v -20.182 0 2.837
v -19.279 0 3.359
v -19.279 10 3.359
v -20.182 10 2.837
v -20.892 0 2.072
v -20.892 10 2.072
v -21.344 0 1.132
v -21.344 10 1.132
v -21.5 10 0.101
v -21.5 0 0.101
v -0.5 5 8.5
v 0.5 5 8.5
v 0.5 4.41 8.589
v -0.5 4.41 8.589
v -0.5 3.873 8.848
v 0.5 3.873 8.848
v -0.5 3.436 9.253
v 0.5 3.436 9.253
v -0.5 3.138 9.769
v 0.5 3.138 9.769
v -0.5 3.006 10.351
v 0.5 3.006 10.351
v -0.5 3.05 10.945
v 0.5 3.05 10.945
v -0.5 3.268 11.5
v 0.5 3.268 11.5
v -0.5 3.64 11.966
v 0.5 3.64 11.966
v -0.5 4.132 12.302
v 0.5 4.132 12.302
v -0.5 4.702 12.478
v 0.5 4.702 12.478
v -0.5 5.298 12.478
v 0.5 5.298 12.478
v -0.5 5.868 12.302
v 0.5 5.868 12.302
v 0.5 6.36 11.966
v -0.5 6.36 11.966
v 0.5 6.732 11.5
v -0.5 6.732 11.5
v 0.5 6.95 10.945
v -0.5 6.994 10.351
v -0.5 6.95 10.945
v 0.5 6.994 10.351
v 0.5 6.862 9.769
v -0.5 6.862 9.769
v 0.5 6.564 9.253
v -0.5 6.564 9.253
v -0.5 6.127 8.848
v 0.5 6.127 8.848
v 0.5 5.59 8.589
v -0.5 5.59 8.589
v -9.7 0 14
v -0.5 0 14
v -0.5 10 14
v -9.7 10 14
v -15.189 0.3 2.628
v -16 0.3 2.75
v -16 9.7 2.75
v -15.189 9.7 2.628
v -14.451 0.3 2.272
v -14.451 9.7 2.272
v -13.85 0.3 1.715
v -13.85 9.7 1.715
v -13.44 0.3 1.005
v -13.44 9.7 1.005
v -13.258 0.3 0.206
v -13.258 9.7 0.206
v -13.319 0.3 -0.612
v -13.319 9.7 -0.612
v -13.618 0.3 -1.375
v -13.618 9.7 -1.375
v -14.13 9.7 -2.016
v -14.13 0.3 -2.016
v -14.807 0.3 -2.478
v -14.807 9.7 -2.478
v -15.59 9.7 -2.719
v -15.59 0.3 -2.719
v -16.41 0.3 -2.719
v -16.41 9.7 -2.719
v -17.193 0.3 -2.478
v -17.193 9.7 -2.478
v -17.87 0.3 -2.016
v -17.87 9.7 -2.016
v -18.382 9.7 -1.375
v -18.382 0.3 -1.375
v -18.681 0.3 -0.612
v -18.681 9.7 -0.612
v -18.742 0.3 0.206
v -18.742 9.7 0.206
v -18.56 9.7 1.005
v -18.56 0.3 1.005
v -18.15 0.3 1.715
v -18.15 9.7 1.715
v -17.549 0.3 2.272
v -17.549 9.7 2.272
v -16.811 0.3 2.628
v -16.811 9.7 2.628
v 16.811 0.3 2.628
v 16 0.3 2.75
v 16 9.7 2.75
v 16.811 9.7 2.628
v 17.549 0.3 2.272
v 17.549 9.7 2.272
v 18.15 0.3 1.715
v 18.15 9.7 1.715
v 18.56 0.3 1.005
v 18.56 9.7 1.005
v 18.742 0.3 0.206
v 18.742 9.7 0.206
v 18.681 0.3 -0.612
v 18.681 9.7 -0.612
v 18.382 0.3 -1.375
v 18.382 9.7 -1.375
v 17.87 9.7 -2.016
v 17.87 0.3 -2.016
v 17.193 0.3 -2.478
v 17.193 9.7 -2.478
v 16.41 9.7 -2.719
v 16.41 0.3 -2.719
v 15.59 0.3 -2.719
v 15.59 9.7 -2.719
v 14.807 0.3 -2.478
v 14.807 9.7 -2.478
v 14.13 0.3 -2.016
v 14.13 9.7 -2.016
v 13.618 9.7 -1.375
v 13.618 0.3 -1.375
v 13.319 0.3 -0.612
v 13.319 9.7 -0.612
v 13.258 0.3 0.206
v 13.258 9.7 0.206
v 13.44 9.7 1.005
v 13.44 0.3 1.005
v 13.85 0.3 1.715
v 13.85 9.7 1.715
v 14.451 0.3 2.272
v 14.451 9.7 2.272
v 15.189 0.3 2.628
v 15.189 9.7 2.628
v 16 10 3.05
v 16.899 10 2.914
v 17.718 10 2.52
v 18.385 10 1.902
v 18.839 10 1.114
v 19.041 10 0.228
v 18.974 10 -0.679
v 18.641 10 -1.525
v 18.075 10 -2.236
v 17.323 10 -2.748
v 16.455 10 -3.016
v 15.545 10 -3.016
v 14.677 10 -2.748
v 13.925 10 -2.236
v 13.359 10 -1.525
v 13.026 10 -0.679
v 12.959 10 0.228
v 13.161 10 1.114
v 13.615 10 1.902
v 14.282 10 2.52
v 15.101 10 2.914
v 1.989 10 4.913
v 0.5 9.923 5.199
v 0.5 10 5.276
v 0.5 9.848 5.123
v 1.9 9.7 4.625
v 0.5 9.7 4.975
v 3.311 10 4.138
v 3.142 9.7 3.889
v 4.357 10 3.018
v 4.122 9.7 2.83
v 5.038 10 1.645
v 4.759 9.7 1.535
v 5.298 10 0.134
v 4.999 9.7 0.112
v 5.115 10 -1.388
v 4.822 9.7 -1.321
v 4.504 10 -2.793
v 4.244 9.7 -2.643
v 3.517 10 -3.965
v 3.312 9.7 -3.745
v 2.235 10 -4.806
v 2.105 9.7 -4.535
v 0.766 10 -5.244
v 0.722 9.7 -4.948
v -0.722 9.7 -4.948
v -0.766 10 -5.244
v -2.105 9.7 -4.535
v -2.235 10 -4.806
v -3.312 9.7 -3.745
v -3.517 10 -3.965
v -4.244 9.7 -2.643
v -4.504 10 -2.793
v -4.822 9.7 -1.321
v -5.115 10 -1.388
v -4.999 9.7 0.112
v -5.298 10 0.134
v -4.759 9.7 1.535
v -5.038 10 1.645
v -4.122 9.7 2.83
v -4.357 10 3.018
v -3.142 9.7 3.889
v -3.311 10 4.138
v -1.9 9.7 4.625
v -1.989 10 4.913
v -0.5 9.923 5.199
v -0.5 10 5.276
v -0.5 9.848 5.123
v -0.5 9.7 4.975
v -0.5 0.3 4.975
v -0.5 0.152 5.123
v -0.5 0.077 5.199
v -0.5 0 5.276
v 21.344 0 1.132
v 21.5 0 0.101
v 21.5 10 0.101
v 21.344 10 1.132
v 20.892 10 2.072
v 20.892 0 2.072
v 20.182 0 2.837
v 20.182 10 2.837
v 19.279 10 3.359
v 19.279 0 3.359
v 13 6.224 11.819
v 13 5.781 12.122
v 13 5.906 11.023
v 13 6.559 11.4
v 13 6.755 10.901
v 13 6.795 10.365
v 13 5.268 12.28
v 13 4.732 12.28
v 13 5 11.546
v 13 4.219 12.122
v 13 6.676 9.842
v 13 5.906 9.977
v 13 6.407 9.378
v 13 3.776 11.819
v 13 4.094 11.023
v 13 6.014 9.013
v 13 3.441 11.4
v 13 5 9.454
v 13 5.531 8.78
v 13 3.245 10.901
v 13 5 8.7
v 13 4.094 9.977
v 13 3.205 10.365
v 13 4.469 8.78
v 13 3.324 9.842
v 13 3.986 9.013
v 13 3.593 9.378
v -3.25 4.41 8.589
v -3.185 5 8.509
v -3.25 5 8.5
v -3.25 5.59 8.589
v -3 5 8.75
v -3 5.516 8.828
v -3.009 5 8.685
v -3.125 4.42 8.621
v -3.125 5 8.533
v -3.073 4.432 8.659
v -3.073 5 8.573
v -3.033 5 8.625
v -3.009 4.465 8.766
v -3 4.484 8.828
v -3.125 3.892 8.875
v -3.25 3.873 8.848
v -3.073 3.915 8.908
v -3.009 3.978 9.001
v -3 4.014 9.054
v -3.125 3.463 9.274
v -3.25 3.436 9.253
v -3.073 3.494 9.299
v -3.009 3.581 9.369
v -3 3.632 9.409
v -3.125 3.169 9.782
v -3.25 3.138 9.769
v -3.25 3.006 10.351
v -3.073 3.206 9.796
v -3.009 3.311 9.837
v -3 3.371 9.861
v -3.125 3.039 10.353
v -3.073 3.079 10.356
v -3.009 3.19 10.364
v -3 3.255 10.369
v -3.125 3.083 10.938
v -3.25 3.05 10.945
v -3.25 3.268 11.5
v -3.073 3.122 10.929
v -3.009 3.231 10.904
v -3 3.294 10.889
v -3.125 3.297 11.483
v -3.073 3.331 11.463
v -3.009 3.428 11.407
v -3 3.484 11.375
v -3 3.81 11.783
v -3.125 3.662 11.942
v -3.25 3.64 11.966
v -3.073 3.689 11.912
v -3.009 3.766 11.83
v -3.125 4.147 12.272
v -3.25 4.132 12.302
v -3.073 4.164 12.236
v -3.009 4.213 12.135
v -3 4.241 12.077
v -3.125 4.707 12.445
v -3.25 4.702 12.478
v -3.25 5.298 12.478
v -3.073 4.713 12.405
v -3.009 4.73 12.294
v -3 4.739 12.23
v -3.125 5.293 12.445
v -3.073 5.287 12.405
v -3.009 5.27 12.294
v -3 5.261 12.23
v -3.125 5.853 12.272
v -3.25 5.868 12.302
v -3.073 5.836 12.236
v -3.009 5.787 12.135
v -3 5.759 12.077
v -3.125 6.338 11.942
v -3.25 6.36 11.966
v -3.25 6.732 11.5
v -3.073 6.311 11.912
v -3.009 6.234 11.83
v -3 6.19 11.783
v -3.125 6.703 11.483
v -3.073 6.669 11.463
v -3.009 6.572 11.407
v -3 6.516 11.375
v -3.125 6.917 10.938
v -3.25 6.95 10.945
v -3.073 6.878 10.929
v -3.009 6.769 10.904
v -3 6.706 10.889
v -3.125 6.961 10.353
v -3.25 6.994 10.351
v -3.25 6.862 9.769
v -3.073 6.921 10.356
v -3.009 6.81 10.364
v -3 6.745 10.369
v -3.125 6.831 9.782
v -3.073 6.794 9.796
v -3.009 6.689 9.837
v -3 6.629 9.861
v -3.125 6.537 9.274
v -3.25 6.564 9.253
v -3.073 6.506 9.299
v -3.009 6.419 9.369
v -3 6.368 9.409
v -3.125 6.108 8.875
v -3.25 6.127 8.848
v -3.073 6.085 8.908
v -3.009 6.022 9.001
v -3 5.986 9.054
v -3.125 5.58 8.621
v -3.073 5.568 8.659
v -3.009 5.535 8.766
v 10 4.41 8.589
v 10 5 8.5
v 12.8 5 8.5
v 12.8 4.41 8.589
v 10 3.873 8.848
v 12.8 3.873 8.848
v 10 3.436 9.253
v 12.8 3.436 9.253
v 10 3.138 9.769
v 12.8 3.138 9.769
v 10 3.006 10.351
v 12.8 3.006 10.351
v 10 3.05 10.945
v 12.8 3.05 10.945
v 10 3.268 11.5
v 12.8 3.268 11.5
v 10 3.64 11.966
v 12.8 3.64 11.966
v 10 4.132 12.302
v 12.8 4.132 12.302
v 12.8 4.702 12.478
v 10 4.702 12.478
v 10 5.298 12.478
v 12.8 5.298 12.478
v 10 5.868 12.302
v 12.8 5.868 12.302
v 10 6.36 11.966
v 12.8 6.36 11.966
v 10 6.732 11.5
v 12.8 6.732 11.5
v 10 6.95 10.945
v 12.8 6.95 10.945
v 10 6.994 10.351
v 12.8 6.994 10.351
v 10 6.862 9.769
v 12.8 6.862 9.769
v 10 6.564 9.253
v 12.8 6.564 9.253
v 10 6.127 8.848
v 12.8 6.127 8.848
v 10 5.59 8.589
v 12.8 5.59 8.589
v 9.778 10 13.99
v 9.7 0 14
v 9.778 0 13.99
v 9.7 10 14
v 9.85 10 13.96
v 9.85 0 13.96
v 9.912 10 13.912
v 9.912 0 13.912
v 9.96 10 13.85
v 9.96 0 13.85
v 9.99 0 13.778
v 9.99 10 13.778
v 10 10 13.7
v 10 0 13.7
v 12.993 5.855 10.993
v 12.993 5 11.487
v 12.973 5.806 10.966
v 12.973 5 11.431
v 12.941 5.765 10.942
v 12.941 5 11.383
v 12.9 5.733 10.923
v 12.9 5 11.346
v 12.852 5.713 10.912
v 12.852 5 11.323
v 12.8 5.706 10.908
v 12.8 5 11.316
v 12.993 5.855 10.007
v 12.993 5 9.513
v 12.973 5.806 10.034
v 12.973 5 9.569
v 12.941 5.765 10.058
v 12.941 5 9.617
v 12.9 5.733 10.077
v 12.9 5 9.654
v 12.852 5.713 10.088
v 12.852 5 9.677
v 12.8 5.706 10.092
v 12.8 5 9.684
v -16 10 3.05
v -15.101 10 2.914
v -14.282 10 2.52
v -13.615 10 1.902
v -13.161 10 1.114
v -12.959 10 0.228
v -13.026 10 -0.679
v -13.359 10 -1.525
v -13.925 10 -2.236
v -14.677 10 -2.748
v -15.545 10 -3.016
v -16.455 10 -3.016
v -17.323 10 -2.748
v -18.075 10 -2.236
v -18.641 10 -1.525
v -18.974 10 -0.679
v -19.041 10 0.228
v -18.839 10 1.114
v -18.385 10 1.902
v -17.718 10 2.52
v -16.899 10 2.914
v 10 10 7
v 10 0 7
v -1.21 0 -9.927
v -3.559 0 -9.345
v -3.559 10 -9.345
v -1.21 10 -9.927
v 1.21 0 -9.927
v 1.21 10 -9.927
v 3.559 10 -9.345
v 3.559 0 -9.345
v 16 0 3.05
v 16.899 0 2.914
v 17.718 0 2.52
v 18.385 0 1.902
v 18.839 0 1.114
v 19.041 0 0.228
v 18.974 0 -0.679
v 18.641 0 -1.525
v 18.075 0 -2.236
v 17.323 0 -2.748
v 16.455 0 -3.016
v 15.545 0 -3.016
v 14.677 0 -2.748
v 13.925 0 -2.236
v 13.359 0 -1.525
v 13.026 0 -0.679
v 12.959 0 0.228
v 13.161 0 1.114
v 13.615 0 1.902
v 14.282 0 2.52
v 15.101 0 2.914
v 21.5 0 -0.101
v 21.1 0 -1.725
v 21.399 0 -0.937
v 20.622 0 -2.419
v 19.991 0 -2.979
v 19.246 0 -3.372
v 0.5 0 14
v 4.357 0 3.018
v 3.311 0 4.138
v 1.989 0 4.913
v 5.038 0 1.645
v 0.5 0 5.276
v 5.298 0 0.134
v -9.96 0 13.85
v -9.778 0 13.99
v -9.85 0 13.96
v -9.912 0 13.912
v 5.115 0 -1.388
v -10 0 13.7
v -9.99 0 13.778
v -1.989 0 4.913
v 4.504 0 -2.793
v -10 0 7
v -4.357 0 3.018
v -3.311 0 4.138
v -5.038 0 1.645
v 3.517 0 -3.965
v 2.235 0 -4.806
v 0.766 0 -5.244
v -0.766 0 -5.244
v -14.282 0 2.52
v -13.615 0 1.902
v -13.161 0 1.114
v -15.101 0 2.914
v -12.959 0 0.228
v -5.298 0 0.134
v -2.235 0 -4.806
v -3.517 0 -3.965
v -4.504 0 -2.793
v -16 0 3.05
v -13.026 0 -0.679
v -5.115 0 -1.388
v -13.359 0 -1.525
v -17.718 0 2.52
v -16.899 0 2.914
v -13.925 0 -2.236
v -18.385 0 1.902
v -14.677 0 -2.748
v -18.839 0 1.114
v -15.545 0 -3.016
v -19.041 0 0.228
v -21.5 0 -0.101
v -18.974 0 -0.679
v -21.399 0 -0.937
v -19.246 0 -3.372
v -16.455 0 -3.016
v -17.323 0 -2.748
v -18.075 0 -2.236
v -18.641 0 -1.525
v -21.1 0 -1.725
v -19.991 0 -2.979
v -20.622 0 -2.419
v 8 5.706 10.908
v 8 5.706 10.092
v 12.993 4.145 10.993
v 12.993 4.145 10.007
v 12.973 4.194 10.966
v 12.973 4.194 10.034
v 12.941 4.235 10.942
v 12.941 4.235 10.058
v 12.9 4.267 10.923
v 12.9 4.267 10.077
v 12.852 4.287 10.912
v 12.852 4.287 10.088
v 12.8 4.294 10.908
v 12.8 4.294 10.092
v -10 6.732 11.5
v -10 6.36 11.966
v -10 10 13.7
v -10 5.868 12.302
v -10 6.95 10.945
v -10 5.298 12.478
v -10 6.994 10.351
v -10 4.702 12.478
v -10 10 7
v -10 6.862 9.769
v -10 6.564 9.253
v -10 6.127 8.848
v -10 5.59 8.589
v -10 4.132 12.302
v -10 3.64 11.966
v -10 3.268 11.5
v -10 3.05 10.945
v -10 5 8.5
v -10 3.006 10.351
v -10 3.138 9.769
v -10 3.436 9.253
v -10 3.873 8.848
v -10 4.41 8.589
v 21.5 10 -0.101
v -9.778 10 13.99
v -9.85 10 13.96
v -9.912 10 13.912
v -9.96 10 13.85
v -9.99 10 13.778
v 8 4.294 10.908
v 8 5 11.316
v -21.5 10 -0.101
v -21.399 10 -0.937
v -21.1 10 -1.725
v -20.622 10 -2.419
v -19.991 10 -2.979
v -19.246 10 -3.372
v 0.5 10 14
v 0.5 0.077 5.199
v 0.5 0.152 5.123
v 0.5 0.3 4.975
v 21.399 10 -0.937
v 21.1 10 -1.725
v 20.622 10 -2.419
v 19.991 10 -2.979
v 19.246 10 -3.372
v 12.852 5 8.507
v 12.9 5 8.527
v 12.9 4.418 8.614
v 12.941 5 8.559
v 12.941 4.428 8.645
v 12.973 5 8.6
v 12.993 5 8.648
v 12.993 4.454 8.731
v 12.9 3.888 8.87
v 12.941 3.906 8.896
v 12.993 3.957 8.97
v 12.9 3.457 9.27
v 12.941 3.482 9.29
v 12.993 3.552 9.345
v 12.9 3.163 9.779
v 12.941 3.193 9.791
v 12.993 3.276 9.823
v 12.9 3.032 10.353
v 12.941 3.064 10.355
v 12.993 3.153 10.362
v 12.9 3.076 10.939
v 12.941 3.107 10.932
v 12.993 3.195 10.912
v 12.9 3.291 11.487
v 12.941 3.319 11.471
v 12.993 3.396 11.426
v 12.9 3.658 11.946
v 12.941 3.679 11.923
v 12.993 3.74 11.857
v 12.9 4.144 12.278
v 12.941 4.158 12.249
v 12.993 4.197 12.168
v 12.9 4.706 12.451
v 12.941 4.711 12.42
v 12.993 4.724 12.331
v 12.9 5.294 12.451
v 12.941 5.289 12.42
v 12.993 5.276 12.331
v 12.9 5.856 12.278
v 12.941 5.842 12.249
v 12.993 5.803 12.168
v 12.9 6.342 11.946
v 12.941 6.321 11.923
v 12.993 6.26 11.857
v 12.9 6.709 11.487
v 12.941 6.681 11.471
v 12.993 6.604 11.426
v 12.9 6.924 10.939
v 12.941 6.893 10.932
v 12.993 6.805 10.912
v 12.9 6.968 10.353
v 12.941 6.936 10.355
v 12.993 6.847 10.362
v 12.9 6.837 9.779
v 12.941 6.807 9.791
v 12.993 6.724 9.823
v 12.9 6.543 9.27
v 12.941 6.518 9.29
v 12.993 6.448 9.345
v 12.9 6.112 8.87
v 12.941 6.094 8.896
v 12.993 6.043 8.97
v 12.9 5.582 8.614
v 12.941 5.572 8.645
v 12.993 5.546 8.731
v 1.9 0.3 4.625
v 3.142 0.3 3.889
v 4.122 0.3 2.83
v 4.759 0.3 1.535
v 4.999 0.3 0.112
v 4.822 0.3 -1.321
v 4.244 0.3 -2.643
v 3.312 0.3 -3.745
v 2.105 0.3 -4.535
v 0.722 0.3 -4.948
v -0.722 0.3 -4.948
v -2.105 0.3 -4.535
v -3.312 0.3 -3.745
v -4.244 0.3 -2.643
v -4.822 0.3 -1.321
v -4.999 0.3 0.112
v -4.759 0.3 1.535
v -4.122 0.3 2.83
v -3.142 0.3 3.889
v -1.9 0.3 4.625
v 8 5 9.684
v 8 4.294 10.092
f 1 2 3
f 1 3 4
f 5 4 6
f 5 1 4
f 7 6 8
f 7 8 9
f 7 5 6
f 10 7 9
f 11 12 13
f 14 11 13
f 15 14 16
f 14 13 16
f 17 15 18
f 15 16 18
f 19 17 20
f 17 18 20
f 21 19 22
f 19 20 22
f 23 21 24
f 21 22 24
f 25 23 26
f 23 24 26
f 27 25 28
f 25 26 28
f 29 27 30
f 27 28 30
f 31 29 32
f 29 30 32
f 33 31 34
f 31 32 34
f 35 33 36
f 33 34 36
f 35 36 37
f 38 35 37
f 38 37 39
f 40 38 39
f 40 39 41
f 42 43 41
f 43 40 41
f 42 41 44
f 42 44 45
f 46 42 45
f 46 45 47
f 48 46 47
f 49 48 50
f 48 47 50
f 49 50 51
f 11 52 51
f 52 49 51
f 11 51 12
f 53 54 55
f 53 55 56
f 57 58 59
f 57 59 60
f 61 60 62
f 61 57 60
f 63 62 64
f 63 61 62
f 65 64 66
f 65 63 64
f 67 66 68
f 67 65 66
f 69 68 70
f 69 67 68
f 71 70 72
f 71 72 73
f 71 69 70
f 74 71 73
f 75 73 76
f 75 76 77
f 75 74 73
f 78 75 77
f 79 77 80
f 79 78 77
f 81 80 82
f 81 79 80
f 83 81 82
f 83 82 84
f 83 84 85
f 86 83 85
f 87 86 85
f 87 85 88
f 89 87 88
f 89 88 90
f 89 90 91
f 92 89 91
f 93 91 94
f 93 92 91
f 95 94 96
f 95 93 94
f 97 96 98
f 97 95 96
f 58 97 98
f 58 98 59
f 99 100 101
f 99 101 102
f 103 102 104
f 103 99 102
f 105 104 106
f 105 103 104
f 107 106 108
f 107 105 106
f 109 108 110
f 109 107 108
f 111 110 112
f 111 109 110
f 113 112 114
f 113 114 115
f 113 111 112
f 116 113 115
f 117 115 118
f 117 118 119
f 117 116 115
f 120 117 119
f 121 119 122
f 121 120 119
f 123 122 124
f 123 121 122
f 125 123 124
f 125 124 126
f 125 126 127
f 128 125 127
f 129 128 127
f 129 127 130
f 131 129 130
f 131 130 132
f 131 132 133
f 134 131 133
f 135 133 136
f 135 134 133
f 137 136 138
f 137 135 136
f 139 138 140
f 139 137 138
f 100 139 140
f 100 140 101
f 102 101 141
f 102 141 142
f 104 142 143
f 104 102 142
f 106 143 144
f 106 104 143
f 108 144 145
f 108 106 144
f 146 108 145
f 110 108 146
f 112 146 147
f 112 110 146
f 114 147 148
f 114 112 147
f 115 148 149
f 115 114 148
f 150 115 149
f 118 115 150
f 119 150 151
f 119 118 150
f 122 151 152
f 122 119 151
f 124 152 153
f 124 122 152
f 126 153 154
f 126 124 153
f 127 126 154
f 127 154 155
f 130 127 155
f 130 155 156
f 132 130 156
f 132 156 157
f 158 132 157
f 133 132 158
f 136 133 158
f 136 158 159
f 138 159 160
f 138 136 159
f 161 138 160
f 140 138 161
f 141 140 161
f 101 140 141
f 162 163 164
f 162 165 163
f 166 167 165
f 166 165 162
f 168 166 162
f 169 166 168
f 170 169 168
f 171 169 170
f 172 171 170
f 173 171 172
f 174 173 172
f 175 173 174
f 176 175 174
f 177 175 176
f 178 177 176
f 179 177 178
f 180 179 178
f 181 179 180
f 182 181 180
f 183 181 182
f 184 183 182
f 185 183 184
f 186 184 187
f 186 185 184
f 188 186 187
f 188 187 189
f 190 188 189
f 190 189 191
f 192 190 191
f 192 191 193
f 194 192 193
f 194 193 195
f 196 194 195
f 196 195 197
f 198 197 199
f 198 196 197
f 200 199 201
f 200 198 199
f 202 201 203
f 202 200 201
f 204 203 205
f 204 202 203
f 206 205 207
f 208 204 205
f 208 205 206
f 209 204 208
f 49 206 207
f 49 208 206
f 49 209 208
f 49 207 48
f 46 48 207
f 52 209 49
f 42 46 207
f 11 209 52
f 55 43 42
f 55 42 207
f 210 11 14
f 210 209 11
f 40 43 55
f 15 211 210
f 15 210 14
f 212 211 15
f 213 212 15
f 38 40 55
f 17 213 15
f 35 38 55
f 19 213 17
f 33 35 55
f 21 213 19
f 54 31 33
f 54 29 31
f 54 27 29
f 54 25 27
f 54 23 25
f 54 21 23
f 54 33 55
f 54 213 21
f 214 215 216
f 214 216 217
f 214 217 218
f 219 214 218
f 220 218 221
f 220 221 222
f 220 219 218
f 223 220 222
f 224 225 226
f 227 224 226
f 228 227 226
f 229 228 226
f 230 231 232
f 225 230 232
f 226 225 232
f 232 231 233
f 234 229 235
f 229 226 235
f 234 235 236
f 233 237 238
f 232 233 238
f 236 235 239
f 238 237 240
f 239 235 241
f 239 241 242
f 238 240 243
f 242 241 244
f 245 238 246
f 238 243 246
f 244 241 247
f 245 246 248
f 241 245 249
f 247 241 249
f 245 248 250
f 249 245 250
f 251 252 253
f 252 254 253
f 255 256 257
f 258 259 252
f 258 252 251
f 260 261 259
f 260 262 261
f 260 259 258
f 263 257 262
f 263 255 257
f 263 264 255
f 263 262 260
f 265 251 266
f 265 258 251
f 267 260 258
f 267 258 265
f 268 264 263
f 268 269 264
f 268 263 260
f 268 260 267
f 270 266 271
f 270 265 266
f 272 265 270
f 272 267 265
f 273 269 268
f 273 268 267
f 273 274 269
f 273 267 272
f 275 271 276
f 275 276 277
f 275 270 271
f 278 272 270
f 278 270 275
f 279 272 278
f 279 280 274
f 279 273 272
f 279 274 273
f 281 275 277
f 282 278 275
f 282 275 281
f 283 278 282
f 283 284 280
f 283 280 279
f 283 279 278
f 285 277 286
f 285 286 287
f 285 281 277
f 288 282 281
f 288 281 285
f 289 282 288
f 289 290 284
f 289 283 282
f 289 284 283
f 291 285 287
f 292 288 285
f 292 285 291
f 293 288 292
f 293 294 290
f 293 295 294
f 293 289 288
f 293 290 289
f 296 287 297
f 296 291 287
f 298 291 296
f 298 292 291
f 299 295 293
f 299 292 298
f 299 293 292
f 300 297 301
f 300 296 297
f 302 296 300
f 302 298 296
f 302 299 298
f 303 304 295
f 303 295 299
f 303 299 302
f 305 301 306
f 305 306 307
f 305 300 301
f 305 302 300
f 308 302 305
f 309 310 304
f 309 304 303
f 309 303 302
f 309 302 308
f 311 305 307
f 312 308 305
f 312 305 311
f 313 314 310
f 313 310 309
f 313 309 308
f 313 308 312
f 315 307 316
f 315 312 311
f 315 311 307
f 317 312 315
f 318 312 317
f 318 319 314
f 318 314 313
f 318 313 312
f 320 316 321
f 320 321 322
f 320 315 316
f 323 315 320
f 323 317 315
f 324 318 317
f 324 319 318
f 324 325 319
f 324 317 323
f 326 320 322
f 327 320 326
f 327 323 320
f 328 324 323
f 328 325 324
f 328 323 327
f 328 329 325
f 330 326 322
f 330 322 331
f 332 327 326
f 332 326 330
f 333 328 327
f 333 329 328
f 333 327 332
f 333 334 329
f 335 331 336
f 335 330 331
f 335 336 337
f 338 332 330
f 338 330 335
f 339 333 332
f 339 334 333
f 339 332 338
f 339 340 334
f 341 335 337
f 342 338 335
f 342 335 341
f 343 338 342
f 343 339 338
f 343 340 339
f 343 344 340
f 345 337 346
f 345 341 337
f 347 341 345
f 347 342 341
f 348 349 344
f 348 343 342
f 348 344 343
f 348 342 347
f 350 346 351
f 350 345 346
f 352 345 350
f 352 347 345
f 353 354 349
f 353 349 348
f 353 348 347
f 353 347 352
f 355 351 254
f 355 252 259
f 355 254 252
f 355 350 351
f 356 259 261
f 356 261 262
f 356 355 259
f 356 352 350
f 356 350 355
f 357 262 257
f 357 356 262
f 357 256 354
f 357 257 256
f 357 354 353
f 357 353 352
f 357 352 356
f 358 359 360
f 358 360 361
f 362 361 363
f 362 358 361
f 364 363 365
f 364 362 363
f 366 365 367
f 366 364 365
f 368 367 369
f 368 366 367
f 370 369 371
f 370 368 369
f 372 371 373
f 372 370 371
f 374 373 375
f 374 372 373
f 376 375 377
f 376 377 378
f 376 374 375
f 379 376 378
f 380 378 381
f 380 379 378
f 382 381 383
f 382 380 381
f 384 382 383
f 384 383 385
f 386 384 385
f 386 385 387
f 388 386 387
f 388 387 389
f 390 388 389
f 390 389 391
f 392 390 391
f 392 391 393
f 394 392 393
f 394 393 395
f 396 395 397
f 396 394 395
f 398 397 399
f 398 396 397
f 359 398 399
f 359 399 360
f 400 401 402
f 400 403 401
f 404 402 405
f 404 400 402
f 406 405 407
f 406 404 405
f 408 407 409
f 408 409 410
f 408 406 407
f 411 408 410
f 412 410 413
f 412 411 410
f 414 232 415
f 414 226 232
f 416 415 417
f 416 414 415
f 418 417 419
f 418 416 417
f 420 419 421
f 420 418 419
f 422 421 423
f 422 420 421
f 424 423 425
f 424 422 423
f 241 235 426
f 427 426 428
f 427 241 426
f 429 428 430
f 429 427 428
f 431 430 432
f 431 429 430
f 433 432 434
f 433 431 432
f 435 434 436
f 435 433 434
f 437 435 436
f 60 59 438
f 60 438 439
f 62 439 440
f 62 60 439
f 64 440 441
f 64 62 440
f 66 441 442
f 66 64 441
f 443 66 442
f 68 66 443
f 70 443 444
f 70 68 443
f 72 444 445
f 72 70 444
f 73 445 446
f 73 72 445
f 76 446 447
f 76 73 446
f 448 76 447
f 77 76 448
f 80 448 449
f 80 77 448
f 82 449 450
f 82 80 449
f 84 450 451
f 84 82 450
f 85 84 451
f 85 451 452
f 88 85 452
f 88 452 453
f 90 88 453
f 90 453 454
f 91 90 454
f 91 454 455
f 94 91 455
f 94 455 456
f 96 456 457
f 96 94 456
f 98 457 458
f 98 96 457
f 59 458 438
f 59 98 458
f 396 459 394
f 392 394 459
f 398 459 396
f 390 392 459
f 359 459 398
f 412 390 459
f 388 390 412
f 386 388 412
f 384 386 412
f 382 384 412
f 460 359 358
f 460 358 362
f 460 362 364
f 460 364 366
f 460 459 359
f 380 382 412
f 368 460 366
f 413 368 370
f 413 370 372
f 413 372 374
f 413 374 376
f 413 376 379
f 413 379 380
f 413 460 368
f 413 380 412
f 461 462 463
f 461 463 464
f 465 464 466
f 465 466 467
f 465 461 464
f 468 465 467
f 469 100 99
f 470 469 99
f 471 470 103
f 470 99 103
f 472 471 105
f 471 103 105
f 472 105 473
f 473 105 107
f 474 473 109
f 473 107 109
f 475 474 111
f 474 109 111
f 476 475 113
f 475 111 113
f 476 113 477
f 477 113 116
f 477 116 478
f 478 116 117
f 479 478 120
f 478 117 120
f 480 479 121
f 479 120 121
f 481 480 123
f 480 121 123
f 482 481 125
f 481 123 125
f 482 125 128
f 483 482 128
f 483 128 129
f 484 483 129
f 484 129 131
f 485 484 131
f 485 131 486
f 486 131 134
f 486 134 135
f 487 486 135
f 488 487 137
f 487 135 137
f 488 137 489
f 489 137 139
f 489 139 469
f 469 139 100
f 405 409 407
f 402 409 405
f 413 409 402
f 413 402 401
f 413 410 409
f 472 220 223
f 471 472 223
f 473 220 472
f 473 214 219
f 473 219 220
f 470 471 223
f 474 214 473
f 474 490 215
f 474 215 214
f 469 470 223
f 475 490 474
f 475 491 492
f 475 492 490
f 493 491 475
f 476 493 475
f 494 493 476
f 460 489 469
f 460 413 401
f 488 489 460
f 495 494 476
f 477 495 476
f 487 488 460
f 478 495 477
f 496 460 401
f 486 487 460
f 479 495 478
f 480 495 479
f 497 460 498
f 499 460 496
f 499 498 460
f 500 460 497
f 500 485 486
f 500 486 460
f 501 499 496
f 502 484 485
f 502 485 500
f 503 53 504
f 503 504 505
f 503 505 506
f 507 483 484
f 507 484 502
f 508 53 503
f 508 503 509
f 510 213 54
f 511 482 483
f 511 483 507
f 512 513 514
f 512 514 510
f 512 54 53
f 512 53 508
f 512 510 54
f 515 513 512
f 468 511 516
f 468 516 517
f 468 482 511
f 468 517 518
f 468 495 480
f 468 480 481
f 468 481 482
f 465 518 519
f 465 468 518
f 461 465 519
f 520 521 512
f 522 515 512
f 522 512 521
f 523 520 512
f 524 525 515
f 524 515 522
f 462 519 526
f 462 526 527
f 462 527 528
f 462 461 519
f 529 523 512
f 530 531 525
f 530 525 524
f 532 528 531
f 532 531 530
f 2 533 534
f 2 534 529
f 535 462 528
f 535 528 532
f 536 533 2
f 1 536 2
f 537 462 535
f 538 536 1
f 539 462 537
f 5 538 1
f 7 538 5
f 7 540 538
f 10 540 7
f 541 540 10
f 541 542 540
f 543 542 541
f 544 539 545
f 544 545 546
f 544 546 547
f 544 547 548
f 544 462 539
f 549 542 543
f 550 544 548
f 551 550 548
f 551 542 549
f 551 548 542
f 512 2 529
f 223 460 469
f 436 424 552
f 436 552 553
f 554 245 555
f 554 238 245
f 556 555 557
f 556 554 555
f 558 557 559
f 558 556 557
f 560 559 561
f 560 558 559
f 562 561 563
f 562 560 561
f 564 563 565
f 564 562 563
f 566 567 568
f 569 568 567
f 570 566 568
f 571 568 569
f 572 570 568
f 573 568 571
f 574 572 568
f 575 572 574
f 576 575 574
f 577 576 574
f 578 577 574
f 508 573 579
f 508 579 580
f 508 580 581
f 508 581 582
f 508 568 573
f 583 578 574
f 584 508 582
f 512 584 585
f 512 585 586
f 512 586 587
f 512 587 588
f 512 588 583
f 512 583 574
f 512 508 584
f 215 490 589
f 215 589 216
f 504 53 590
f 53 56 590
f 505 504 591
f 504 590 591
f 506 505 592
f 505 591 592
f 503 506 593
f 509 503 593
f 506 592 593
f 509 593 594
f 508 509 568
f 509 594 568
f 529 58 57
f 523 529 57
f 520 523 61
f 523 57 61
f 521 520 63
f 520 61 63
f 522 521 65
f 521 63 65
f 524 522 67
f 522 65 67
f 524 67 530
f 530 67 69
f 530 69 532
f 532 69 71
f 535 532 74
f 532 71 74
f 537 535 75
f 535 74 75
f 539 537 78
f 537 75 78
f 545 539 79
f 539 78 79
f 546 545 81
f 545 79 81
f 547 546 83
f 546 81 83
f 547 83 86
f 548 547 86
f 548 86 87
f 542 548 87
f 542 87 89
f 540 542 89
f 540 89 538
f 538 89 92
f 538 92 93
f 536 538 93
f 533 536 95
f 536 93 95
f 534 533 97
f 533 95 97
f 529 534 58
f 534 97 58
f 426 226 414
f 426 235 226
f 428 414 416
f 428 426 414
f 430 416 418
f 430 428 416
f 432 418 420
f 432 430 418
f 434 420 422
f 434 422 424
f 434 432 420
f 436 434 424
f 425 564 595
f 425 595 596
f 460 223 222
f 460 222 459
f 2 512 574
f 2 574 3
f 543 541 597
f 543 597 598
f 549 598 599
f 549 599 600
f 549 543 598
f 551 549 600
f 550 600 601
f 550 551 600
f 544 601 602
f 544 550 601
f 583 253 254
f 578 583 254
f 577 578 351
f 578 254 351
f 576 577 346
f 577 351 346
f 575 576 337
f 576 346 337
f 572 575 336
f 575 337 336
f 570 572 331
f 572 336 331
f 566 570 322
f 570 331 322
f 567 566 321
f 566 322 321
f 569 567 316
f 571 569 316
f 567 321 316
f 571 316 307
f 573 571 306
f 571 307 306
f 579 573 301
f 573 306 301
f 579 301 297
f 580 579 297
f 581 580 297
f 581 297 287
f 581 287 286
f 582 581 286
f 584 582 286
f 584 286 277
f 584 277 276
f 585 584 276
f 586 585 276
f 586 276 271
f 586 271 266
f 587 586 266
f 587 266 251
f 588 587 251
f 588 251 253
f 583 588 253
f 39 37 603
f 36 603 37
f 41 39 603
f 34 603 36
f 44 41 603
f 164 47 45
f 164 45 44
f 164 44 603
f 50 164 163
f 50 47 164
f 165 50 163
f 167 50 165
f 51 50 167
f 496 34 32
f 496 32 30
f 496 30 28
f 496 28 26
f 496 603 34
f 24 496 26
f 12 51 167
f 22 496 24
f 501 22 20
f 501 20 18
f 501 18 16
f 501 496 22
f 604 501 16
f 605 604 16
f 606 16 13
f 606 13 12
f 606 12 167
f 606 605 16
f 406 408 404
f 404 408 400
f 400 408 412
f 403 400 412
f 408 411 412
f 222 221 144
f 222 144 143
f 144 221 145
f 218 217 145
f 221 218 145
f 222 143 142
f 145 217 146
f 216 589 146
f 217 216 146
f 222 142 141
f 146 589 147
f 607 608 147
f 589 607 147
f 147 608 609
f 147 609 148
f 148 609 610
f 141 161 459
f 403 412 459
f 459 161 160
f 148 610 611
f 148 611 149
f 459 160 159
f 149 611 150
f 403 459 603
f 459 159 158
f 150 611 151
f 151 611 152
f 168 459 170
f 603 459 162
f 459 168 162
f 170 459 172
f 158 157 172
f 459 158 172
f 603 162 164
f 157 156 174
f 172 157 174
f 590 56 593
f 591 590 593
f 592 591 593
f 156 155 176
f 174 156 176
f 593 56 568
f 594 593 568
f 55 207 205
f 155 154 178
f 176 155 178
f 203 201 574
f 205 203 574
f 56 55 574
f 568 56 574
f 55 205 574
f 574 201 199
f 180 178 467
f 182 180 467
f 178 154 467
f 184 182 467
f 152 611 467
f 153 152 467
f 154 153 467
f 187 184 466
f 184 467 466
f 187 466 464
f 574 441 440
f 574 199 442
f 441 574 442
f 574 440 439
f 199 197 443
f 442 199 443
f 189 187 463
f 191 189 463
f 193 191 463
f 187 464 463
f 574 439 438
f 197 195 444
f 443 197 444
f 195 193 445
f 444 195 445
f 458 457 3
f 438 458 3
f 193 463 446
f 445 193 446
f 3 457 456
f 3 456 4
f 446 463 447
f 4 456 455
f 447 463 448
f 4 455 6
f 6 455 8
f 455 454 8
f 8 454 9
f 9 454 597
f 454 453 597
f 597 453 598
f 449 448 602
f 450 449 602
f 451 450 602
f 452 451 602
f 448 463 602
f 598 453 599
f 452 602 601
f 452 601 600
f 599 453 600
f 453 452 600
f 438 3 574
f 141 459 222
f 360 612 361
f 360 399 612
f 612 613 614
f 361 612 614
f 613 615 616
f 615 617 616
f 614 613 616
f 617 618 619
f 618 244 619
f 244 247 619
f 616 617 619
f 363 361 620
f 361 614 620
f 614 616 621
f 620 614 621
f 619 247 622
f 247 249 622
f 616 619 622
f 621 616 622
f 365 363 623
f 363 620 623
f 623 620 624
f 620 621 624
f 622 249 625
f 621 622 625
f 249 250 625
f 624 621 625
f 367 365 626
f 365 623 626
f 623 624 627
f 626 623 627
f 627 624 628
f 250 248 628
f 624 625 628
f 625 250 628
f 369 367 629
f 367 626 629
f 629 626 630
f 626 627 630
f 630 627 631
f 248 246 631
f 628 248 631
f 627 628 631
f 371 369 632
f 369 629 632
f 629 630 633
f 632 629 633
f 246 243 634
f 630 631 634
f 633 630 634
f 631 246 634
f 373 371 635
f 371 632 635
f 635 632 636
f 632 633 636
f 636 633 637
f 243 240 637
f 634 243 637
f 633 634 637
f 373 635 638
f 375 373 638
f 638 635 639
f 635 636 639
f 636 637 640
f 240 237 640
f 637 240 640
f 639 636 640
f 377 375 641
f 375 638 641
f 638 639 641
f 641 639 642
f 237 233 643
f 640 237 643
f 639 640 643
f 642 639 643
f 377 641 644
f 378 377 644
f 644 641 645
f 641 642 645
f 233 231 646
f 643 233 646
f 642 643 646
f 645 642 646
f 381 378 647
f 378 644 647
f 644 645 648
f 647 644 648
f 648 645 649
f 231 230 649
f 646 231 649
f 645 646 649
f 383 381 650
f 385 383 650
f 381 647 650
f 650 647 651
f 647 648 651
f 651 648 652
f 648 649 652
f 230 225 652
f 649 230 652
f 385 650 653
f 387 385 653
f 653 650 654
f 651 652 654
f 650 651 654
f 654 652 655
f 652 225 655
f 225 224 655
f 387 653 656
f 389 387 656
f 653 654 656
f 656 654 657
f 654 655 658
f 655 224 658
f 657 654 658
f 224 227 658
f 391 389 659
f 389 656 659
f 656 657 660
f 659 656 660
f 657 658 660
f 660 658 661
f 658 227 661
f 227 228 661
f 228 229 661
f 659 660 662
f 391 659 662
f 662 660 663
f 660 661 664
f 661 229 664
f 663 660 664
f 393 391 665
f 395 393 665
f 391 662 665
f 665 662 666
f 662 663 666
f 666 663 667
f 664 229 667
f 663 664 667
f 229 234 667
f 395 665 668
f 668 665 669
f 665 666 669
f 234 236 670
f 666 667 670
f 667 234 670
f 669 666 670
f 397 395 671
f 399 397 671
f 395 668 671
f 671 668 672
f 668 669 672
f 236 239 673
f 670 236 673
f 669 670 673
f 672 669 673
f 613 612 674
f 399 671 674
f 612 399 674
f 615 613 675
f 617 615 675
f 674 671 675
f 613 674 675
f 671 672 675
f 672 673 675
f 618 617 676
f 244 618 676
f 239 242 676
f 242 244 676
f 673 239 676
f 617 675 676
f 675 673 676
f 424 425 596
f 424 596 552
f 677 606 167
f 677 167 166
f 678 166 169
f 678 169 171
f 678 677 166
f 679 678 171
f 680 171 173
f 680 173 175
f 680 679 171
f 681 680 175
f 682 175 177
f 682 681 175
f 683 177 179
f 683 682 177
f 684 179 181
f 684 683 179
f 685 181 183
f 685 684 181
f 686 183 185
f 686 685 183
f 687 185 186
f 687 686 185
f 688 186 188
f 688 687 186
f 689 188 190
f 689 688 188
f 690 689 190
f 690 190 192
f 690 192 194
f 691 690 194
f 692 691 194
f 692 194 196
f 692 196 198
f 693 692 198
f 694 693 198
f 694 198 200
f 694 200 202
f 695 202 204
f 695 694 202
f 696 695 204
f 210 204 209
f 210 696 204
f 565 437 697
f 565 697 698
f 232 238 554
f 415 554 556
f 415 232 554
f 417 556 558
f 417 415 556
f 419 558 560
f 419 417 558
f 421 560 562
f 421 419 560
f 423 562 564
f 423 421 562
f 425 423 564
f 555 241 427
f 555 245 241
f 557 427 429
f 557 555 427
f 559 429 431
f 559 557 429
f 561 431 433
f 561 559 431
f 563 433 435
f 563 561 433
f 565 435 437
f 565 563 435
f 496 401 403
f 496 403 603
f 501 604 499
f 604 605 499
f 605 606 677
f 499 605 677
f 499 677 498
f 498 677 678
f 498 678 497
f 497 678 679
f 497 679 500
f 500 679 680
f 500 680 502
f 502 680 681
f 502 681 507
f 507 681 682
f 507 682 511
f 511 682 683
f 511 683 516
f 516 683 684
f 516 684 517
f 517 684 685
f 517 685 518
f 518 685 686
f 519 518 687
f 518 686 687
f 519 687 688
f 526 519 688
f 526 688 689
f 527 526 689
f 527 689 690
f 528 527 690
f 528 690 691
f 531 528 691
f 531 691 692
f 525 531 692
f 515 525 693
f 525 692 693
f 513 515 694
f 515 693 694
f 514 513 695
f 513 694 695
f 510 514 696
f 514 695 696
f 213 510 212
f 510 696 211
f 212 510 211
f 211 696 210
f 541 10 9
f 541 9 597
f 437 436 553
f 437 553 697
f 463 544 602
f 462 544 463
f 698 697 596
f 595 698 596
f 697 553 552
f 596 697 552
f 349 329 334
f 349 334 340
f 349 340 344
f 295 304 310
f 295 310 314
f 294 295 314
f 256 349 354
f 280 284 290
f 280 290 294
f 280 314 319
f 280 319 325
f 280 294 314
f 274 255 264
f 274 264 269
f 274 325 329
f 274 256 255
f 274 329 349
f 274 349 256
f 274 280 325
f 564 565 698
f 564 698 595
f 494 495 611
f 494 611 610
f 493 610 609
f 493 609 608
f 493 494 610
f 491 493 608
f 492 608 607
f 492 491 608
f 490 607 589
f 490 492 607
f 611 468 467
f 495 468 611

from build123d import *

# Parameters (mm, degrees)
SKETCH1_R                     = 2.75
BOSS_EXTRUDE1_DEPTH           = 10
SKETCH3_R                     = 2
CUT_EXTRUDE1_DEPTH            = 32.5
ESBO_O1_R                     = 2
RESSALTO_EXTRUS_O2_DEPTH      = 13
RESSALTO_EXTRUS_O2_DEPTH_BACK = 3
CORTE_EXTRUS_O1_DEPTH         = 5
FILETE1_R                     = 0.2
FILETE2_R                     = 0.25
CHAMFER_1_SIZE                = 0.3
FILLET_1_R                    = 0.3


with BuildPart() as part:
    # Sketch1 → Boss-Extrude1 (new body)
    with BuildSketch(Plane(origin=(0, 0, 0), x_dir=(1, 0, 0), z_dir=(0, 1, 0))):
        with BuildLine():
            Line((21.5, 0.100660355), (21.5, -0.100660355))
            ThreePointArc((21.5, -0.100660355), (20.891804651, -2.072326113), (19.278590937, -3.35875876))
            Line((19.278590937, -3.35875876), (10, -7))
            Line((10, -7), (10, -14))
            Line((10, -14), (0.5, -14))
            Line((0.5, -14), (0.5, -4.974937186))
            ThreePointArc((0.5, -4.974937186), (0, 5), (-0.5, -4.974937186))
            Line((-0.5, -4.974937186), (-0.5, -14))
            Line((-0.5, -14), (-10, -14))
            Line((-10, -14), (-10, -7))
            Line((-10, -7), (-19.278590937, -3.35875876))
            ThreePointArc((-19.278590937, -3.35875876), (-20.891804651, -2.072326113), (-21.5, -0.100660355))
            Line((-21.5, -0.100660355), (-21.5, 0.100660355))
            ThreePointArc((-21.5, 0.100660355), (-20.881804225, 2.086914218), (-19.245597481, 3.371514512))
            Line((-19.245597481, 3.371514512), (-3.558849946, 9.345297591))
            ThreePointArc((-3.558849946, 9.345297591), (0, 10), (3.558849946, 9.345297591))
            Line((3.558849946, 9.345297591), (19.245597481, 3.371514512))
            ThreePointArc((19.245597481, 3.371514512), (20.881804225, 2.086914218), (21.5, 0.100660355))
        make_face()
        with Locations(Location((-16, 0, 0), (0, 0, 270))):  # turned: the seam where the file's is
            Circle(SKETCH1_R, mode=Mode.SUBTRACT)
        with Locations(Location((16, 0, 0), (0, 0, 270))):  # turned: the seam where the file's is
            Circle(SKETCH1_R, mode=Mode.SUBTRACT)
    extrude(amount=BOSS_EXTRUDE1_DEPTH)

    # Sketch3 → Cut-Extrude1 (cut, through all)
    with BuildSketch(Plane(origin=(10, 0, 0), x_dir=(0, 0, -1), z_dir=(1, 0, 0))):
        with Locations((-10.5, 5)):
            Circle(SKETCH3_R)
    extrude(amount=-CUT_EXTRUDE1_DEPTH, mode=Mode.SUBTRACT)

    # Esboço1 → Ressalto-extrusão2 (add, two sides)
    with BuildSketch(Plane.ZY.offset(-10)) as ressalto_extrus_o2_sk:
        with Locations(Location((10.5, 5, 0), (0, 0, 180))):  # turned: the seam where the file's is
            Circle(ESBO_O1_R)
    extrude(amount=RESSALTO_EXTRUS_O2_DEPTH)
    extrude(ressalto_extrus_o2_sk.sketch, amount=-RESSALTO_EXTRUS_O2_DEPTH_BACK)

    # Esboço2 → Corte-extrusão1 (cut)
    with BuildSketch(Plane.ZY.offset(-13)):
        Polygon((10.90776936, 4.293722751), (11.315538719, 5), (10.90776936, 5.706277249), (10.09223064, 5.706277249), (9.684461281, 5), (10.09223064, 4.293722751), align=None)
    extrude(amount=CORTE_EXTRUS_O1_DEPTH, mode=Mode.SUBTRACT)

    # Filete1
    filete1_edges = [part.edges().sort_by_distance(p)[0] for p in [
        (13, 5, 12.5),
        (13, 4.646861376, 11.11165404),
        (13, 4.293722751, 10.5),
        (13, 4.646861376, 9.88834596),
        (13, 5.353138624, 9.88834596),
        (13, 5.706277249, 10.5),
        (13, 5.353138624, 11.11165404),
    ]]
    fillet(filete1_edges, radius=FILETE1_R)

    # Filete2
    filete2_edges = [part.edges().sort_by_distance(p)[0] for p in [
        (-3, 5, 12.5),
    ]]
    fillet(filete2_edges, radius=FILETE2_R)

    # Фаска1
    chamfer_1_edges = [part.edges().sort_by_distance(p)[0] for p in [
        (0, 0, -5),
        (-16, 0, -2.75),
        (0, 10, -5),
        (-16, 10, -2.75),
        (16, 0, -2.75),
        (16, 10, -2.75),
    ]]
    chamfer(chamfer_1_edges, length=CHAMFER_1_SIZE)

    # Скругление1
    fillet_1_edges = [part.edges().sort_by_distance(p)[0] for p in [
        (10, 5, 14),
        (-10, 5, 14),
    ]]
    fillet(fillet_1_edges, radius=FILLET_1_R)


solid = part.part
